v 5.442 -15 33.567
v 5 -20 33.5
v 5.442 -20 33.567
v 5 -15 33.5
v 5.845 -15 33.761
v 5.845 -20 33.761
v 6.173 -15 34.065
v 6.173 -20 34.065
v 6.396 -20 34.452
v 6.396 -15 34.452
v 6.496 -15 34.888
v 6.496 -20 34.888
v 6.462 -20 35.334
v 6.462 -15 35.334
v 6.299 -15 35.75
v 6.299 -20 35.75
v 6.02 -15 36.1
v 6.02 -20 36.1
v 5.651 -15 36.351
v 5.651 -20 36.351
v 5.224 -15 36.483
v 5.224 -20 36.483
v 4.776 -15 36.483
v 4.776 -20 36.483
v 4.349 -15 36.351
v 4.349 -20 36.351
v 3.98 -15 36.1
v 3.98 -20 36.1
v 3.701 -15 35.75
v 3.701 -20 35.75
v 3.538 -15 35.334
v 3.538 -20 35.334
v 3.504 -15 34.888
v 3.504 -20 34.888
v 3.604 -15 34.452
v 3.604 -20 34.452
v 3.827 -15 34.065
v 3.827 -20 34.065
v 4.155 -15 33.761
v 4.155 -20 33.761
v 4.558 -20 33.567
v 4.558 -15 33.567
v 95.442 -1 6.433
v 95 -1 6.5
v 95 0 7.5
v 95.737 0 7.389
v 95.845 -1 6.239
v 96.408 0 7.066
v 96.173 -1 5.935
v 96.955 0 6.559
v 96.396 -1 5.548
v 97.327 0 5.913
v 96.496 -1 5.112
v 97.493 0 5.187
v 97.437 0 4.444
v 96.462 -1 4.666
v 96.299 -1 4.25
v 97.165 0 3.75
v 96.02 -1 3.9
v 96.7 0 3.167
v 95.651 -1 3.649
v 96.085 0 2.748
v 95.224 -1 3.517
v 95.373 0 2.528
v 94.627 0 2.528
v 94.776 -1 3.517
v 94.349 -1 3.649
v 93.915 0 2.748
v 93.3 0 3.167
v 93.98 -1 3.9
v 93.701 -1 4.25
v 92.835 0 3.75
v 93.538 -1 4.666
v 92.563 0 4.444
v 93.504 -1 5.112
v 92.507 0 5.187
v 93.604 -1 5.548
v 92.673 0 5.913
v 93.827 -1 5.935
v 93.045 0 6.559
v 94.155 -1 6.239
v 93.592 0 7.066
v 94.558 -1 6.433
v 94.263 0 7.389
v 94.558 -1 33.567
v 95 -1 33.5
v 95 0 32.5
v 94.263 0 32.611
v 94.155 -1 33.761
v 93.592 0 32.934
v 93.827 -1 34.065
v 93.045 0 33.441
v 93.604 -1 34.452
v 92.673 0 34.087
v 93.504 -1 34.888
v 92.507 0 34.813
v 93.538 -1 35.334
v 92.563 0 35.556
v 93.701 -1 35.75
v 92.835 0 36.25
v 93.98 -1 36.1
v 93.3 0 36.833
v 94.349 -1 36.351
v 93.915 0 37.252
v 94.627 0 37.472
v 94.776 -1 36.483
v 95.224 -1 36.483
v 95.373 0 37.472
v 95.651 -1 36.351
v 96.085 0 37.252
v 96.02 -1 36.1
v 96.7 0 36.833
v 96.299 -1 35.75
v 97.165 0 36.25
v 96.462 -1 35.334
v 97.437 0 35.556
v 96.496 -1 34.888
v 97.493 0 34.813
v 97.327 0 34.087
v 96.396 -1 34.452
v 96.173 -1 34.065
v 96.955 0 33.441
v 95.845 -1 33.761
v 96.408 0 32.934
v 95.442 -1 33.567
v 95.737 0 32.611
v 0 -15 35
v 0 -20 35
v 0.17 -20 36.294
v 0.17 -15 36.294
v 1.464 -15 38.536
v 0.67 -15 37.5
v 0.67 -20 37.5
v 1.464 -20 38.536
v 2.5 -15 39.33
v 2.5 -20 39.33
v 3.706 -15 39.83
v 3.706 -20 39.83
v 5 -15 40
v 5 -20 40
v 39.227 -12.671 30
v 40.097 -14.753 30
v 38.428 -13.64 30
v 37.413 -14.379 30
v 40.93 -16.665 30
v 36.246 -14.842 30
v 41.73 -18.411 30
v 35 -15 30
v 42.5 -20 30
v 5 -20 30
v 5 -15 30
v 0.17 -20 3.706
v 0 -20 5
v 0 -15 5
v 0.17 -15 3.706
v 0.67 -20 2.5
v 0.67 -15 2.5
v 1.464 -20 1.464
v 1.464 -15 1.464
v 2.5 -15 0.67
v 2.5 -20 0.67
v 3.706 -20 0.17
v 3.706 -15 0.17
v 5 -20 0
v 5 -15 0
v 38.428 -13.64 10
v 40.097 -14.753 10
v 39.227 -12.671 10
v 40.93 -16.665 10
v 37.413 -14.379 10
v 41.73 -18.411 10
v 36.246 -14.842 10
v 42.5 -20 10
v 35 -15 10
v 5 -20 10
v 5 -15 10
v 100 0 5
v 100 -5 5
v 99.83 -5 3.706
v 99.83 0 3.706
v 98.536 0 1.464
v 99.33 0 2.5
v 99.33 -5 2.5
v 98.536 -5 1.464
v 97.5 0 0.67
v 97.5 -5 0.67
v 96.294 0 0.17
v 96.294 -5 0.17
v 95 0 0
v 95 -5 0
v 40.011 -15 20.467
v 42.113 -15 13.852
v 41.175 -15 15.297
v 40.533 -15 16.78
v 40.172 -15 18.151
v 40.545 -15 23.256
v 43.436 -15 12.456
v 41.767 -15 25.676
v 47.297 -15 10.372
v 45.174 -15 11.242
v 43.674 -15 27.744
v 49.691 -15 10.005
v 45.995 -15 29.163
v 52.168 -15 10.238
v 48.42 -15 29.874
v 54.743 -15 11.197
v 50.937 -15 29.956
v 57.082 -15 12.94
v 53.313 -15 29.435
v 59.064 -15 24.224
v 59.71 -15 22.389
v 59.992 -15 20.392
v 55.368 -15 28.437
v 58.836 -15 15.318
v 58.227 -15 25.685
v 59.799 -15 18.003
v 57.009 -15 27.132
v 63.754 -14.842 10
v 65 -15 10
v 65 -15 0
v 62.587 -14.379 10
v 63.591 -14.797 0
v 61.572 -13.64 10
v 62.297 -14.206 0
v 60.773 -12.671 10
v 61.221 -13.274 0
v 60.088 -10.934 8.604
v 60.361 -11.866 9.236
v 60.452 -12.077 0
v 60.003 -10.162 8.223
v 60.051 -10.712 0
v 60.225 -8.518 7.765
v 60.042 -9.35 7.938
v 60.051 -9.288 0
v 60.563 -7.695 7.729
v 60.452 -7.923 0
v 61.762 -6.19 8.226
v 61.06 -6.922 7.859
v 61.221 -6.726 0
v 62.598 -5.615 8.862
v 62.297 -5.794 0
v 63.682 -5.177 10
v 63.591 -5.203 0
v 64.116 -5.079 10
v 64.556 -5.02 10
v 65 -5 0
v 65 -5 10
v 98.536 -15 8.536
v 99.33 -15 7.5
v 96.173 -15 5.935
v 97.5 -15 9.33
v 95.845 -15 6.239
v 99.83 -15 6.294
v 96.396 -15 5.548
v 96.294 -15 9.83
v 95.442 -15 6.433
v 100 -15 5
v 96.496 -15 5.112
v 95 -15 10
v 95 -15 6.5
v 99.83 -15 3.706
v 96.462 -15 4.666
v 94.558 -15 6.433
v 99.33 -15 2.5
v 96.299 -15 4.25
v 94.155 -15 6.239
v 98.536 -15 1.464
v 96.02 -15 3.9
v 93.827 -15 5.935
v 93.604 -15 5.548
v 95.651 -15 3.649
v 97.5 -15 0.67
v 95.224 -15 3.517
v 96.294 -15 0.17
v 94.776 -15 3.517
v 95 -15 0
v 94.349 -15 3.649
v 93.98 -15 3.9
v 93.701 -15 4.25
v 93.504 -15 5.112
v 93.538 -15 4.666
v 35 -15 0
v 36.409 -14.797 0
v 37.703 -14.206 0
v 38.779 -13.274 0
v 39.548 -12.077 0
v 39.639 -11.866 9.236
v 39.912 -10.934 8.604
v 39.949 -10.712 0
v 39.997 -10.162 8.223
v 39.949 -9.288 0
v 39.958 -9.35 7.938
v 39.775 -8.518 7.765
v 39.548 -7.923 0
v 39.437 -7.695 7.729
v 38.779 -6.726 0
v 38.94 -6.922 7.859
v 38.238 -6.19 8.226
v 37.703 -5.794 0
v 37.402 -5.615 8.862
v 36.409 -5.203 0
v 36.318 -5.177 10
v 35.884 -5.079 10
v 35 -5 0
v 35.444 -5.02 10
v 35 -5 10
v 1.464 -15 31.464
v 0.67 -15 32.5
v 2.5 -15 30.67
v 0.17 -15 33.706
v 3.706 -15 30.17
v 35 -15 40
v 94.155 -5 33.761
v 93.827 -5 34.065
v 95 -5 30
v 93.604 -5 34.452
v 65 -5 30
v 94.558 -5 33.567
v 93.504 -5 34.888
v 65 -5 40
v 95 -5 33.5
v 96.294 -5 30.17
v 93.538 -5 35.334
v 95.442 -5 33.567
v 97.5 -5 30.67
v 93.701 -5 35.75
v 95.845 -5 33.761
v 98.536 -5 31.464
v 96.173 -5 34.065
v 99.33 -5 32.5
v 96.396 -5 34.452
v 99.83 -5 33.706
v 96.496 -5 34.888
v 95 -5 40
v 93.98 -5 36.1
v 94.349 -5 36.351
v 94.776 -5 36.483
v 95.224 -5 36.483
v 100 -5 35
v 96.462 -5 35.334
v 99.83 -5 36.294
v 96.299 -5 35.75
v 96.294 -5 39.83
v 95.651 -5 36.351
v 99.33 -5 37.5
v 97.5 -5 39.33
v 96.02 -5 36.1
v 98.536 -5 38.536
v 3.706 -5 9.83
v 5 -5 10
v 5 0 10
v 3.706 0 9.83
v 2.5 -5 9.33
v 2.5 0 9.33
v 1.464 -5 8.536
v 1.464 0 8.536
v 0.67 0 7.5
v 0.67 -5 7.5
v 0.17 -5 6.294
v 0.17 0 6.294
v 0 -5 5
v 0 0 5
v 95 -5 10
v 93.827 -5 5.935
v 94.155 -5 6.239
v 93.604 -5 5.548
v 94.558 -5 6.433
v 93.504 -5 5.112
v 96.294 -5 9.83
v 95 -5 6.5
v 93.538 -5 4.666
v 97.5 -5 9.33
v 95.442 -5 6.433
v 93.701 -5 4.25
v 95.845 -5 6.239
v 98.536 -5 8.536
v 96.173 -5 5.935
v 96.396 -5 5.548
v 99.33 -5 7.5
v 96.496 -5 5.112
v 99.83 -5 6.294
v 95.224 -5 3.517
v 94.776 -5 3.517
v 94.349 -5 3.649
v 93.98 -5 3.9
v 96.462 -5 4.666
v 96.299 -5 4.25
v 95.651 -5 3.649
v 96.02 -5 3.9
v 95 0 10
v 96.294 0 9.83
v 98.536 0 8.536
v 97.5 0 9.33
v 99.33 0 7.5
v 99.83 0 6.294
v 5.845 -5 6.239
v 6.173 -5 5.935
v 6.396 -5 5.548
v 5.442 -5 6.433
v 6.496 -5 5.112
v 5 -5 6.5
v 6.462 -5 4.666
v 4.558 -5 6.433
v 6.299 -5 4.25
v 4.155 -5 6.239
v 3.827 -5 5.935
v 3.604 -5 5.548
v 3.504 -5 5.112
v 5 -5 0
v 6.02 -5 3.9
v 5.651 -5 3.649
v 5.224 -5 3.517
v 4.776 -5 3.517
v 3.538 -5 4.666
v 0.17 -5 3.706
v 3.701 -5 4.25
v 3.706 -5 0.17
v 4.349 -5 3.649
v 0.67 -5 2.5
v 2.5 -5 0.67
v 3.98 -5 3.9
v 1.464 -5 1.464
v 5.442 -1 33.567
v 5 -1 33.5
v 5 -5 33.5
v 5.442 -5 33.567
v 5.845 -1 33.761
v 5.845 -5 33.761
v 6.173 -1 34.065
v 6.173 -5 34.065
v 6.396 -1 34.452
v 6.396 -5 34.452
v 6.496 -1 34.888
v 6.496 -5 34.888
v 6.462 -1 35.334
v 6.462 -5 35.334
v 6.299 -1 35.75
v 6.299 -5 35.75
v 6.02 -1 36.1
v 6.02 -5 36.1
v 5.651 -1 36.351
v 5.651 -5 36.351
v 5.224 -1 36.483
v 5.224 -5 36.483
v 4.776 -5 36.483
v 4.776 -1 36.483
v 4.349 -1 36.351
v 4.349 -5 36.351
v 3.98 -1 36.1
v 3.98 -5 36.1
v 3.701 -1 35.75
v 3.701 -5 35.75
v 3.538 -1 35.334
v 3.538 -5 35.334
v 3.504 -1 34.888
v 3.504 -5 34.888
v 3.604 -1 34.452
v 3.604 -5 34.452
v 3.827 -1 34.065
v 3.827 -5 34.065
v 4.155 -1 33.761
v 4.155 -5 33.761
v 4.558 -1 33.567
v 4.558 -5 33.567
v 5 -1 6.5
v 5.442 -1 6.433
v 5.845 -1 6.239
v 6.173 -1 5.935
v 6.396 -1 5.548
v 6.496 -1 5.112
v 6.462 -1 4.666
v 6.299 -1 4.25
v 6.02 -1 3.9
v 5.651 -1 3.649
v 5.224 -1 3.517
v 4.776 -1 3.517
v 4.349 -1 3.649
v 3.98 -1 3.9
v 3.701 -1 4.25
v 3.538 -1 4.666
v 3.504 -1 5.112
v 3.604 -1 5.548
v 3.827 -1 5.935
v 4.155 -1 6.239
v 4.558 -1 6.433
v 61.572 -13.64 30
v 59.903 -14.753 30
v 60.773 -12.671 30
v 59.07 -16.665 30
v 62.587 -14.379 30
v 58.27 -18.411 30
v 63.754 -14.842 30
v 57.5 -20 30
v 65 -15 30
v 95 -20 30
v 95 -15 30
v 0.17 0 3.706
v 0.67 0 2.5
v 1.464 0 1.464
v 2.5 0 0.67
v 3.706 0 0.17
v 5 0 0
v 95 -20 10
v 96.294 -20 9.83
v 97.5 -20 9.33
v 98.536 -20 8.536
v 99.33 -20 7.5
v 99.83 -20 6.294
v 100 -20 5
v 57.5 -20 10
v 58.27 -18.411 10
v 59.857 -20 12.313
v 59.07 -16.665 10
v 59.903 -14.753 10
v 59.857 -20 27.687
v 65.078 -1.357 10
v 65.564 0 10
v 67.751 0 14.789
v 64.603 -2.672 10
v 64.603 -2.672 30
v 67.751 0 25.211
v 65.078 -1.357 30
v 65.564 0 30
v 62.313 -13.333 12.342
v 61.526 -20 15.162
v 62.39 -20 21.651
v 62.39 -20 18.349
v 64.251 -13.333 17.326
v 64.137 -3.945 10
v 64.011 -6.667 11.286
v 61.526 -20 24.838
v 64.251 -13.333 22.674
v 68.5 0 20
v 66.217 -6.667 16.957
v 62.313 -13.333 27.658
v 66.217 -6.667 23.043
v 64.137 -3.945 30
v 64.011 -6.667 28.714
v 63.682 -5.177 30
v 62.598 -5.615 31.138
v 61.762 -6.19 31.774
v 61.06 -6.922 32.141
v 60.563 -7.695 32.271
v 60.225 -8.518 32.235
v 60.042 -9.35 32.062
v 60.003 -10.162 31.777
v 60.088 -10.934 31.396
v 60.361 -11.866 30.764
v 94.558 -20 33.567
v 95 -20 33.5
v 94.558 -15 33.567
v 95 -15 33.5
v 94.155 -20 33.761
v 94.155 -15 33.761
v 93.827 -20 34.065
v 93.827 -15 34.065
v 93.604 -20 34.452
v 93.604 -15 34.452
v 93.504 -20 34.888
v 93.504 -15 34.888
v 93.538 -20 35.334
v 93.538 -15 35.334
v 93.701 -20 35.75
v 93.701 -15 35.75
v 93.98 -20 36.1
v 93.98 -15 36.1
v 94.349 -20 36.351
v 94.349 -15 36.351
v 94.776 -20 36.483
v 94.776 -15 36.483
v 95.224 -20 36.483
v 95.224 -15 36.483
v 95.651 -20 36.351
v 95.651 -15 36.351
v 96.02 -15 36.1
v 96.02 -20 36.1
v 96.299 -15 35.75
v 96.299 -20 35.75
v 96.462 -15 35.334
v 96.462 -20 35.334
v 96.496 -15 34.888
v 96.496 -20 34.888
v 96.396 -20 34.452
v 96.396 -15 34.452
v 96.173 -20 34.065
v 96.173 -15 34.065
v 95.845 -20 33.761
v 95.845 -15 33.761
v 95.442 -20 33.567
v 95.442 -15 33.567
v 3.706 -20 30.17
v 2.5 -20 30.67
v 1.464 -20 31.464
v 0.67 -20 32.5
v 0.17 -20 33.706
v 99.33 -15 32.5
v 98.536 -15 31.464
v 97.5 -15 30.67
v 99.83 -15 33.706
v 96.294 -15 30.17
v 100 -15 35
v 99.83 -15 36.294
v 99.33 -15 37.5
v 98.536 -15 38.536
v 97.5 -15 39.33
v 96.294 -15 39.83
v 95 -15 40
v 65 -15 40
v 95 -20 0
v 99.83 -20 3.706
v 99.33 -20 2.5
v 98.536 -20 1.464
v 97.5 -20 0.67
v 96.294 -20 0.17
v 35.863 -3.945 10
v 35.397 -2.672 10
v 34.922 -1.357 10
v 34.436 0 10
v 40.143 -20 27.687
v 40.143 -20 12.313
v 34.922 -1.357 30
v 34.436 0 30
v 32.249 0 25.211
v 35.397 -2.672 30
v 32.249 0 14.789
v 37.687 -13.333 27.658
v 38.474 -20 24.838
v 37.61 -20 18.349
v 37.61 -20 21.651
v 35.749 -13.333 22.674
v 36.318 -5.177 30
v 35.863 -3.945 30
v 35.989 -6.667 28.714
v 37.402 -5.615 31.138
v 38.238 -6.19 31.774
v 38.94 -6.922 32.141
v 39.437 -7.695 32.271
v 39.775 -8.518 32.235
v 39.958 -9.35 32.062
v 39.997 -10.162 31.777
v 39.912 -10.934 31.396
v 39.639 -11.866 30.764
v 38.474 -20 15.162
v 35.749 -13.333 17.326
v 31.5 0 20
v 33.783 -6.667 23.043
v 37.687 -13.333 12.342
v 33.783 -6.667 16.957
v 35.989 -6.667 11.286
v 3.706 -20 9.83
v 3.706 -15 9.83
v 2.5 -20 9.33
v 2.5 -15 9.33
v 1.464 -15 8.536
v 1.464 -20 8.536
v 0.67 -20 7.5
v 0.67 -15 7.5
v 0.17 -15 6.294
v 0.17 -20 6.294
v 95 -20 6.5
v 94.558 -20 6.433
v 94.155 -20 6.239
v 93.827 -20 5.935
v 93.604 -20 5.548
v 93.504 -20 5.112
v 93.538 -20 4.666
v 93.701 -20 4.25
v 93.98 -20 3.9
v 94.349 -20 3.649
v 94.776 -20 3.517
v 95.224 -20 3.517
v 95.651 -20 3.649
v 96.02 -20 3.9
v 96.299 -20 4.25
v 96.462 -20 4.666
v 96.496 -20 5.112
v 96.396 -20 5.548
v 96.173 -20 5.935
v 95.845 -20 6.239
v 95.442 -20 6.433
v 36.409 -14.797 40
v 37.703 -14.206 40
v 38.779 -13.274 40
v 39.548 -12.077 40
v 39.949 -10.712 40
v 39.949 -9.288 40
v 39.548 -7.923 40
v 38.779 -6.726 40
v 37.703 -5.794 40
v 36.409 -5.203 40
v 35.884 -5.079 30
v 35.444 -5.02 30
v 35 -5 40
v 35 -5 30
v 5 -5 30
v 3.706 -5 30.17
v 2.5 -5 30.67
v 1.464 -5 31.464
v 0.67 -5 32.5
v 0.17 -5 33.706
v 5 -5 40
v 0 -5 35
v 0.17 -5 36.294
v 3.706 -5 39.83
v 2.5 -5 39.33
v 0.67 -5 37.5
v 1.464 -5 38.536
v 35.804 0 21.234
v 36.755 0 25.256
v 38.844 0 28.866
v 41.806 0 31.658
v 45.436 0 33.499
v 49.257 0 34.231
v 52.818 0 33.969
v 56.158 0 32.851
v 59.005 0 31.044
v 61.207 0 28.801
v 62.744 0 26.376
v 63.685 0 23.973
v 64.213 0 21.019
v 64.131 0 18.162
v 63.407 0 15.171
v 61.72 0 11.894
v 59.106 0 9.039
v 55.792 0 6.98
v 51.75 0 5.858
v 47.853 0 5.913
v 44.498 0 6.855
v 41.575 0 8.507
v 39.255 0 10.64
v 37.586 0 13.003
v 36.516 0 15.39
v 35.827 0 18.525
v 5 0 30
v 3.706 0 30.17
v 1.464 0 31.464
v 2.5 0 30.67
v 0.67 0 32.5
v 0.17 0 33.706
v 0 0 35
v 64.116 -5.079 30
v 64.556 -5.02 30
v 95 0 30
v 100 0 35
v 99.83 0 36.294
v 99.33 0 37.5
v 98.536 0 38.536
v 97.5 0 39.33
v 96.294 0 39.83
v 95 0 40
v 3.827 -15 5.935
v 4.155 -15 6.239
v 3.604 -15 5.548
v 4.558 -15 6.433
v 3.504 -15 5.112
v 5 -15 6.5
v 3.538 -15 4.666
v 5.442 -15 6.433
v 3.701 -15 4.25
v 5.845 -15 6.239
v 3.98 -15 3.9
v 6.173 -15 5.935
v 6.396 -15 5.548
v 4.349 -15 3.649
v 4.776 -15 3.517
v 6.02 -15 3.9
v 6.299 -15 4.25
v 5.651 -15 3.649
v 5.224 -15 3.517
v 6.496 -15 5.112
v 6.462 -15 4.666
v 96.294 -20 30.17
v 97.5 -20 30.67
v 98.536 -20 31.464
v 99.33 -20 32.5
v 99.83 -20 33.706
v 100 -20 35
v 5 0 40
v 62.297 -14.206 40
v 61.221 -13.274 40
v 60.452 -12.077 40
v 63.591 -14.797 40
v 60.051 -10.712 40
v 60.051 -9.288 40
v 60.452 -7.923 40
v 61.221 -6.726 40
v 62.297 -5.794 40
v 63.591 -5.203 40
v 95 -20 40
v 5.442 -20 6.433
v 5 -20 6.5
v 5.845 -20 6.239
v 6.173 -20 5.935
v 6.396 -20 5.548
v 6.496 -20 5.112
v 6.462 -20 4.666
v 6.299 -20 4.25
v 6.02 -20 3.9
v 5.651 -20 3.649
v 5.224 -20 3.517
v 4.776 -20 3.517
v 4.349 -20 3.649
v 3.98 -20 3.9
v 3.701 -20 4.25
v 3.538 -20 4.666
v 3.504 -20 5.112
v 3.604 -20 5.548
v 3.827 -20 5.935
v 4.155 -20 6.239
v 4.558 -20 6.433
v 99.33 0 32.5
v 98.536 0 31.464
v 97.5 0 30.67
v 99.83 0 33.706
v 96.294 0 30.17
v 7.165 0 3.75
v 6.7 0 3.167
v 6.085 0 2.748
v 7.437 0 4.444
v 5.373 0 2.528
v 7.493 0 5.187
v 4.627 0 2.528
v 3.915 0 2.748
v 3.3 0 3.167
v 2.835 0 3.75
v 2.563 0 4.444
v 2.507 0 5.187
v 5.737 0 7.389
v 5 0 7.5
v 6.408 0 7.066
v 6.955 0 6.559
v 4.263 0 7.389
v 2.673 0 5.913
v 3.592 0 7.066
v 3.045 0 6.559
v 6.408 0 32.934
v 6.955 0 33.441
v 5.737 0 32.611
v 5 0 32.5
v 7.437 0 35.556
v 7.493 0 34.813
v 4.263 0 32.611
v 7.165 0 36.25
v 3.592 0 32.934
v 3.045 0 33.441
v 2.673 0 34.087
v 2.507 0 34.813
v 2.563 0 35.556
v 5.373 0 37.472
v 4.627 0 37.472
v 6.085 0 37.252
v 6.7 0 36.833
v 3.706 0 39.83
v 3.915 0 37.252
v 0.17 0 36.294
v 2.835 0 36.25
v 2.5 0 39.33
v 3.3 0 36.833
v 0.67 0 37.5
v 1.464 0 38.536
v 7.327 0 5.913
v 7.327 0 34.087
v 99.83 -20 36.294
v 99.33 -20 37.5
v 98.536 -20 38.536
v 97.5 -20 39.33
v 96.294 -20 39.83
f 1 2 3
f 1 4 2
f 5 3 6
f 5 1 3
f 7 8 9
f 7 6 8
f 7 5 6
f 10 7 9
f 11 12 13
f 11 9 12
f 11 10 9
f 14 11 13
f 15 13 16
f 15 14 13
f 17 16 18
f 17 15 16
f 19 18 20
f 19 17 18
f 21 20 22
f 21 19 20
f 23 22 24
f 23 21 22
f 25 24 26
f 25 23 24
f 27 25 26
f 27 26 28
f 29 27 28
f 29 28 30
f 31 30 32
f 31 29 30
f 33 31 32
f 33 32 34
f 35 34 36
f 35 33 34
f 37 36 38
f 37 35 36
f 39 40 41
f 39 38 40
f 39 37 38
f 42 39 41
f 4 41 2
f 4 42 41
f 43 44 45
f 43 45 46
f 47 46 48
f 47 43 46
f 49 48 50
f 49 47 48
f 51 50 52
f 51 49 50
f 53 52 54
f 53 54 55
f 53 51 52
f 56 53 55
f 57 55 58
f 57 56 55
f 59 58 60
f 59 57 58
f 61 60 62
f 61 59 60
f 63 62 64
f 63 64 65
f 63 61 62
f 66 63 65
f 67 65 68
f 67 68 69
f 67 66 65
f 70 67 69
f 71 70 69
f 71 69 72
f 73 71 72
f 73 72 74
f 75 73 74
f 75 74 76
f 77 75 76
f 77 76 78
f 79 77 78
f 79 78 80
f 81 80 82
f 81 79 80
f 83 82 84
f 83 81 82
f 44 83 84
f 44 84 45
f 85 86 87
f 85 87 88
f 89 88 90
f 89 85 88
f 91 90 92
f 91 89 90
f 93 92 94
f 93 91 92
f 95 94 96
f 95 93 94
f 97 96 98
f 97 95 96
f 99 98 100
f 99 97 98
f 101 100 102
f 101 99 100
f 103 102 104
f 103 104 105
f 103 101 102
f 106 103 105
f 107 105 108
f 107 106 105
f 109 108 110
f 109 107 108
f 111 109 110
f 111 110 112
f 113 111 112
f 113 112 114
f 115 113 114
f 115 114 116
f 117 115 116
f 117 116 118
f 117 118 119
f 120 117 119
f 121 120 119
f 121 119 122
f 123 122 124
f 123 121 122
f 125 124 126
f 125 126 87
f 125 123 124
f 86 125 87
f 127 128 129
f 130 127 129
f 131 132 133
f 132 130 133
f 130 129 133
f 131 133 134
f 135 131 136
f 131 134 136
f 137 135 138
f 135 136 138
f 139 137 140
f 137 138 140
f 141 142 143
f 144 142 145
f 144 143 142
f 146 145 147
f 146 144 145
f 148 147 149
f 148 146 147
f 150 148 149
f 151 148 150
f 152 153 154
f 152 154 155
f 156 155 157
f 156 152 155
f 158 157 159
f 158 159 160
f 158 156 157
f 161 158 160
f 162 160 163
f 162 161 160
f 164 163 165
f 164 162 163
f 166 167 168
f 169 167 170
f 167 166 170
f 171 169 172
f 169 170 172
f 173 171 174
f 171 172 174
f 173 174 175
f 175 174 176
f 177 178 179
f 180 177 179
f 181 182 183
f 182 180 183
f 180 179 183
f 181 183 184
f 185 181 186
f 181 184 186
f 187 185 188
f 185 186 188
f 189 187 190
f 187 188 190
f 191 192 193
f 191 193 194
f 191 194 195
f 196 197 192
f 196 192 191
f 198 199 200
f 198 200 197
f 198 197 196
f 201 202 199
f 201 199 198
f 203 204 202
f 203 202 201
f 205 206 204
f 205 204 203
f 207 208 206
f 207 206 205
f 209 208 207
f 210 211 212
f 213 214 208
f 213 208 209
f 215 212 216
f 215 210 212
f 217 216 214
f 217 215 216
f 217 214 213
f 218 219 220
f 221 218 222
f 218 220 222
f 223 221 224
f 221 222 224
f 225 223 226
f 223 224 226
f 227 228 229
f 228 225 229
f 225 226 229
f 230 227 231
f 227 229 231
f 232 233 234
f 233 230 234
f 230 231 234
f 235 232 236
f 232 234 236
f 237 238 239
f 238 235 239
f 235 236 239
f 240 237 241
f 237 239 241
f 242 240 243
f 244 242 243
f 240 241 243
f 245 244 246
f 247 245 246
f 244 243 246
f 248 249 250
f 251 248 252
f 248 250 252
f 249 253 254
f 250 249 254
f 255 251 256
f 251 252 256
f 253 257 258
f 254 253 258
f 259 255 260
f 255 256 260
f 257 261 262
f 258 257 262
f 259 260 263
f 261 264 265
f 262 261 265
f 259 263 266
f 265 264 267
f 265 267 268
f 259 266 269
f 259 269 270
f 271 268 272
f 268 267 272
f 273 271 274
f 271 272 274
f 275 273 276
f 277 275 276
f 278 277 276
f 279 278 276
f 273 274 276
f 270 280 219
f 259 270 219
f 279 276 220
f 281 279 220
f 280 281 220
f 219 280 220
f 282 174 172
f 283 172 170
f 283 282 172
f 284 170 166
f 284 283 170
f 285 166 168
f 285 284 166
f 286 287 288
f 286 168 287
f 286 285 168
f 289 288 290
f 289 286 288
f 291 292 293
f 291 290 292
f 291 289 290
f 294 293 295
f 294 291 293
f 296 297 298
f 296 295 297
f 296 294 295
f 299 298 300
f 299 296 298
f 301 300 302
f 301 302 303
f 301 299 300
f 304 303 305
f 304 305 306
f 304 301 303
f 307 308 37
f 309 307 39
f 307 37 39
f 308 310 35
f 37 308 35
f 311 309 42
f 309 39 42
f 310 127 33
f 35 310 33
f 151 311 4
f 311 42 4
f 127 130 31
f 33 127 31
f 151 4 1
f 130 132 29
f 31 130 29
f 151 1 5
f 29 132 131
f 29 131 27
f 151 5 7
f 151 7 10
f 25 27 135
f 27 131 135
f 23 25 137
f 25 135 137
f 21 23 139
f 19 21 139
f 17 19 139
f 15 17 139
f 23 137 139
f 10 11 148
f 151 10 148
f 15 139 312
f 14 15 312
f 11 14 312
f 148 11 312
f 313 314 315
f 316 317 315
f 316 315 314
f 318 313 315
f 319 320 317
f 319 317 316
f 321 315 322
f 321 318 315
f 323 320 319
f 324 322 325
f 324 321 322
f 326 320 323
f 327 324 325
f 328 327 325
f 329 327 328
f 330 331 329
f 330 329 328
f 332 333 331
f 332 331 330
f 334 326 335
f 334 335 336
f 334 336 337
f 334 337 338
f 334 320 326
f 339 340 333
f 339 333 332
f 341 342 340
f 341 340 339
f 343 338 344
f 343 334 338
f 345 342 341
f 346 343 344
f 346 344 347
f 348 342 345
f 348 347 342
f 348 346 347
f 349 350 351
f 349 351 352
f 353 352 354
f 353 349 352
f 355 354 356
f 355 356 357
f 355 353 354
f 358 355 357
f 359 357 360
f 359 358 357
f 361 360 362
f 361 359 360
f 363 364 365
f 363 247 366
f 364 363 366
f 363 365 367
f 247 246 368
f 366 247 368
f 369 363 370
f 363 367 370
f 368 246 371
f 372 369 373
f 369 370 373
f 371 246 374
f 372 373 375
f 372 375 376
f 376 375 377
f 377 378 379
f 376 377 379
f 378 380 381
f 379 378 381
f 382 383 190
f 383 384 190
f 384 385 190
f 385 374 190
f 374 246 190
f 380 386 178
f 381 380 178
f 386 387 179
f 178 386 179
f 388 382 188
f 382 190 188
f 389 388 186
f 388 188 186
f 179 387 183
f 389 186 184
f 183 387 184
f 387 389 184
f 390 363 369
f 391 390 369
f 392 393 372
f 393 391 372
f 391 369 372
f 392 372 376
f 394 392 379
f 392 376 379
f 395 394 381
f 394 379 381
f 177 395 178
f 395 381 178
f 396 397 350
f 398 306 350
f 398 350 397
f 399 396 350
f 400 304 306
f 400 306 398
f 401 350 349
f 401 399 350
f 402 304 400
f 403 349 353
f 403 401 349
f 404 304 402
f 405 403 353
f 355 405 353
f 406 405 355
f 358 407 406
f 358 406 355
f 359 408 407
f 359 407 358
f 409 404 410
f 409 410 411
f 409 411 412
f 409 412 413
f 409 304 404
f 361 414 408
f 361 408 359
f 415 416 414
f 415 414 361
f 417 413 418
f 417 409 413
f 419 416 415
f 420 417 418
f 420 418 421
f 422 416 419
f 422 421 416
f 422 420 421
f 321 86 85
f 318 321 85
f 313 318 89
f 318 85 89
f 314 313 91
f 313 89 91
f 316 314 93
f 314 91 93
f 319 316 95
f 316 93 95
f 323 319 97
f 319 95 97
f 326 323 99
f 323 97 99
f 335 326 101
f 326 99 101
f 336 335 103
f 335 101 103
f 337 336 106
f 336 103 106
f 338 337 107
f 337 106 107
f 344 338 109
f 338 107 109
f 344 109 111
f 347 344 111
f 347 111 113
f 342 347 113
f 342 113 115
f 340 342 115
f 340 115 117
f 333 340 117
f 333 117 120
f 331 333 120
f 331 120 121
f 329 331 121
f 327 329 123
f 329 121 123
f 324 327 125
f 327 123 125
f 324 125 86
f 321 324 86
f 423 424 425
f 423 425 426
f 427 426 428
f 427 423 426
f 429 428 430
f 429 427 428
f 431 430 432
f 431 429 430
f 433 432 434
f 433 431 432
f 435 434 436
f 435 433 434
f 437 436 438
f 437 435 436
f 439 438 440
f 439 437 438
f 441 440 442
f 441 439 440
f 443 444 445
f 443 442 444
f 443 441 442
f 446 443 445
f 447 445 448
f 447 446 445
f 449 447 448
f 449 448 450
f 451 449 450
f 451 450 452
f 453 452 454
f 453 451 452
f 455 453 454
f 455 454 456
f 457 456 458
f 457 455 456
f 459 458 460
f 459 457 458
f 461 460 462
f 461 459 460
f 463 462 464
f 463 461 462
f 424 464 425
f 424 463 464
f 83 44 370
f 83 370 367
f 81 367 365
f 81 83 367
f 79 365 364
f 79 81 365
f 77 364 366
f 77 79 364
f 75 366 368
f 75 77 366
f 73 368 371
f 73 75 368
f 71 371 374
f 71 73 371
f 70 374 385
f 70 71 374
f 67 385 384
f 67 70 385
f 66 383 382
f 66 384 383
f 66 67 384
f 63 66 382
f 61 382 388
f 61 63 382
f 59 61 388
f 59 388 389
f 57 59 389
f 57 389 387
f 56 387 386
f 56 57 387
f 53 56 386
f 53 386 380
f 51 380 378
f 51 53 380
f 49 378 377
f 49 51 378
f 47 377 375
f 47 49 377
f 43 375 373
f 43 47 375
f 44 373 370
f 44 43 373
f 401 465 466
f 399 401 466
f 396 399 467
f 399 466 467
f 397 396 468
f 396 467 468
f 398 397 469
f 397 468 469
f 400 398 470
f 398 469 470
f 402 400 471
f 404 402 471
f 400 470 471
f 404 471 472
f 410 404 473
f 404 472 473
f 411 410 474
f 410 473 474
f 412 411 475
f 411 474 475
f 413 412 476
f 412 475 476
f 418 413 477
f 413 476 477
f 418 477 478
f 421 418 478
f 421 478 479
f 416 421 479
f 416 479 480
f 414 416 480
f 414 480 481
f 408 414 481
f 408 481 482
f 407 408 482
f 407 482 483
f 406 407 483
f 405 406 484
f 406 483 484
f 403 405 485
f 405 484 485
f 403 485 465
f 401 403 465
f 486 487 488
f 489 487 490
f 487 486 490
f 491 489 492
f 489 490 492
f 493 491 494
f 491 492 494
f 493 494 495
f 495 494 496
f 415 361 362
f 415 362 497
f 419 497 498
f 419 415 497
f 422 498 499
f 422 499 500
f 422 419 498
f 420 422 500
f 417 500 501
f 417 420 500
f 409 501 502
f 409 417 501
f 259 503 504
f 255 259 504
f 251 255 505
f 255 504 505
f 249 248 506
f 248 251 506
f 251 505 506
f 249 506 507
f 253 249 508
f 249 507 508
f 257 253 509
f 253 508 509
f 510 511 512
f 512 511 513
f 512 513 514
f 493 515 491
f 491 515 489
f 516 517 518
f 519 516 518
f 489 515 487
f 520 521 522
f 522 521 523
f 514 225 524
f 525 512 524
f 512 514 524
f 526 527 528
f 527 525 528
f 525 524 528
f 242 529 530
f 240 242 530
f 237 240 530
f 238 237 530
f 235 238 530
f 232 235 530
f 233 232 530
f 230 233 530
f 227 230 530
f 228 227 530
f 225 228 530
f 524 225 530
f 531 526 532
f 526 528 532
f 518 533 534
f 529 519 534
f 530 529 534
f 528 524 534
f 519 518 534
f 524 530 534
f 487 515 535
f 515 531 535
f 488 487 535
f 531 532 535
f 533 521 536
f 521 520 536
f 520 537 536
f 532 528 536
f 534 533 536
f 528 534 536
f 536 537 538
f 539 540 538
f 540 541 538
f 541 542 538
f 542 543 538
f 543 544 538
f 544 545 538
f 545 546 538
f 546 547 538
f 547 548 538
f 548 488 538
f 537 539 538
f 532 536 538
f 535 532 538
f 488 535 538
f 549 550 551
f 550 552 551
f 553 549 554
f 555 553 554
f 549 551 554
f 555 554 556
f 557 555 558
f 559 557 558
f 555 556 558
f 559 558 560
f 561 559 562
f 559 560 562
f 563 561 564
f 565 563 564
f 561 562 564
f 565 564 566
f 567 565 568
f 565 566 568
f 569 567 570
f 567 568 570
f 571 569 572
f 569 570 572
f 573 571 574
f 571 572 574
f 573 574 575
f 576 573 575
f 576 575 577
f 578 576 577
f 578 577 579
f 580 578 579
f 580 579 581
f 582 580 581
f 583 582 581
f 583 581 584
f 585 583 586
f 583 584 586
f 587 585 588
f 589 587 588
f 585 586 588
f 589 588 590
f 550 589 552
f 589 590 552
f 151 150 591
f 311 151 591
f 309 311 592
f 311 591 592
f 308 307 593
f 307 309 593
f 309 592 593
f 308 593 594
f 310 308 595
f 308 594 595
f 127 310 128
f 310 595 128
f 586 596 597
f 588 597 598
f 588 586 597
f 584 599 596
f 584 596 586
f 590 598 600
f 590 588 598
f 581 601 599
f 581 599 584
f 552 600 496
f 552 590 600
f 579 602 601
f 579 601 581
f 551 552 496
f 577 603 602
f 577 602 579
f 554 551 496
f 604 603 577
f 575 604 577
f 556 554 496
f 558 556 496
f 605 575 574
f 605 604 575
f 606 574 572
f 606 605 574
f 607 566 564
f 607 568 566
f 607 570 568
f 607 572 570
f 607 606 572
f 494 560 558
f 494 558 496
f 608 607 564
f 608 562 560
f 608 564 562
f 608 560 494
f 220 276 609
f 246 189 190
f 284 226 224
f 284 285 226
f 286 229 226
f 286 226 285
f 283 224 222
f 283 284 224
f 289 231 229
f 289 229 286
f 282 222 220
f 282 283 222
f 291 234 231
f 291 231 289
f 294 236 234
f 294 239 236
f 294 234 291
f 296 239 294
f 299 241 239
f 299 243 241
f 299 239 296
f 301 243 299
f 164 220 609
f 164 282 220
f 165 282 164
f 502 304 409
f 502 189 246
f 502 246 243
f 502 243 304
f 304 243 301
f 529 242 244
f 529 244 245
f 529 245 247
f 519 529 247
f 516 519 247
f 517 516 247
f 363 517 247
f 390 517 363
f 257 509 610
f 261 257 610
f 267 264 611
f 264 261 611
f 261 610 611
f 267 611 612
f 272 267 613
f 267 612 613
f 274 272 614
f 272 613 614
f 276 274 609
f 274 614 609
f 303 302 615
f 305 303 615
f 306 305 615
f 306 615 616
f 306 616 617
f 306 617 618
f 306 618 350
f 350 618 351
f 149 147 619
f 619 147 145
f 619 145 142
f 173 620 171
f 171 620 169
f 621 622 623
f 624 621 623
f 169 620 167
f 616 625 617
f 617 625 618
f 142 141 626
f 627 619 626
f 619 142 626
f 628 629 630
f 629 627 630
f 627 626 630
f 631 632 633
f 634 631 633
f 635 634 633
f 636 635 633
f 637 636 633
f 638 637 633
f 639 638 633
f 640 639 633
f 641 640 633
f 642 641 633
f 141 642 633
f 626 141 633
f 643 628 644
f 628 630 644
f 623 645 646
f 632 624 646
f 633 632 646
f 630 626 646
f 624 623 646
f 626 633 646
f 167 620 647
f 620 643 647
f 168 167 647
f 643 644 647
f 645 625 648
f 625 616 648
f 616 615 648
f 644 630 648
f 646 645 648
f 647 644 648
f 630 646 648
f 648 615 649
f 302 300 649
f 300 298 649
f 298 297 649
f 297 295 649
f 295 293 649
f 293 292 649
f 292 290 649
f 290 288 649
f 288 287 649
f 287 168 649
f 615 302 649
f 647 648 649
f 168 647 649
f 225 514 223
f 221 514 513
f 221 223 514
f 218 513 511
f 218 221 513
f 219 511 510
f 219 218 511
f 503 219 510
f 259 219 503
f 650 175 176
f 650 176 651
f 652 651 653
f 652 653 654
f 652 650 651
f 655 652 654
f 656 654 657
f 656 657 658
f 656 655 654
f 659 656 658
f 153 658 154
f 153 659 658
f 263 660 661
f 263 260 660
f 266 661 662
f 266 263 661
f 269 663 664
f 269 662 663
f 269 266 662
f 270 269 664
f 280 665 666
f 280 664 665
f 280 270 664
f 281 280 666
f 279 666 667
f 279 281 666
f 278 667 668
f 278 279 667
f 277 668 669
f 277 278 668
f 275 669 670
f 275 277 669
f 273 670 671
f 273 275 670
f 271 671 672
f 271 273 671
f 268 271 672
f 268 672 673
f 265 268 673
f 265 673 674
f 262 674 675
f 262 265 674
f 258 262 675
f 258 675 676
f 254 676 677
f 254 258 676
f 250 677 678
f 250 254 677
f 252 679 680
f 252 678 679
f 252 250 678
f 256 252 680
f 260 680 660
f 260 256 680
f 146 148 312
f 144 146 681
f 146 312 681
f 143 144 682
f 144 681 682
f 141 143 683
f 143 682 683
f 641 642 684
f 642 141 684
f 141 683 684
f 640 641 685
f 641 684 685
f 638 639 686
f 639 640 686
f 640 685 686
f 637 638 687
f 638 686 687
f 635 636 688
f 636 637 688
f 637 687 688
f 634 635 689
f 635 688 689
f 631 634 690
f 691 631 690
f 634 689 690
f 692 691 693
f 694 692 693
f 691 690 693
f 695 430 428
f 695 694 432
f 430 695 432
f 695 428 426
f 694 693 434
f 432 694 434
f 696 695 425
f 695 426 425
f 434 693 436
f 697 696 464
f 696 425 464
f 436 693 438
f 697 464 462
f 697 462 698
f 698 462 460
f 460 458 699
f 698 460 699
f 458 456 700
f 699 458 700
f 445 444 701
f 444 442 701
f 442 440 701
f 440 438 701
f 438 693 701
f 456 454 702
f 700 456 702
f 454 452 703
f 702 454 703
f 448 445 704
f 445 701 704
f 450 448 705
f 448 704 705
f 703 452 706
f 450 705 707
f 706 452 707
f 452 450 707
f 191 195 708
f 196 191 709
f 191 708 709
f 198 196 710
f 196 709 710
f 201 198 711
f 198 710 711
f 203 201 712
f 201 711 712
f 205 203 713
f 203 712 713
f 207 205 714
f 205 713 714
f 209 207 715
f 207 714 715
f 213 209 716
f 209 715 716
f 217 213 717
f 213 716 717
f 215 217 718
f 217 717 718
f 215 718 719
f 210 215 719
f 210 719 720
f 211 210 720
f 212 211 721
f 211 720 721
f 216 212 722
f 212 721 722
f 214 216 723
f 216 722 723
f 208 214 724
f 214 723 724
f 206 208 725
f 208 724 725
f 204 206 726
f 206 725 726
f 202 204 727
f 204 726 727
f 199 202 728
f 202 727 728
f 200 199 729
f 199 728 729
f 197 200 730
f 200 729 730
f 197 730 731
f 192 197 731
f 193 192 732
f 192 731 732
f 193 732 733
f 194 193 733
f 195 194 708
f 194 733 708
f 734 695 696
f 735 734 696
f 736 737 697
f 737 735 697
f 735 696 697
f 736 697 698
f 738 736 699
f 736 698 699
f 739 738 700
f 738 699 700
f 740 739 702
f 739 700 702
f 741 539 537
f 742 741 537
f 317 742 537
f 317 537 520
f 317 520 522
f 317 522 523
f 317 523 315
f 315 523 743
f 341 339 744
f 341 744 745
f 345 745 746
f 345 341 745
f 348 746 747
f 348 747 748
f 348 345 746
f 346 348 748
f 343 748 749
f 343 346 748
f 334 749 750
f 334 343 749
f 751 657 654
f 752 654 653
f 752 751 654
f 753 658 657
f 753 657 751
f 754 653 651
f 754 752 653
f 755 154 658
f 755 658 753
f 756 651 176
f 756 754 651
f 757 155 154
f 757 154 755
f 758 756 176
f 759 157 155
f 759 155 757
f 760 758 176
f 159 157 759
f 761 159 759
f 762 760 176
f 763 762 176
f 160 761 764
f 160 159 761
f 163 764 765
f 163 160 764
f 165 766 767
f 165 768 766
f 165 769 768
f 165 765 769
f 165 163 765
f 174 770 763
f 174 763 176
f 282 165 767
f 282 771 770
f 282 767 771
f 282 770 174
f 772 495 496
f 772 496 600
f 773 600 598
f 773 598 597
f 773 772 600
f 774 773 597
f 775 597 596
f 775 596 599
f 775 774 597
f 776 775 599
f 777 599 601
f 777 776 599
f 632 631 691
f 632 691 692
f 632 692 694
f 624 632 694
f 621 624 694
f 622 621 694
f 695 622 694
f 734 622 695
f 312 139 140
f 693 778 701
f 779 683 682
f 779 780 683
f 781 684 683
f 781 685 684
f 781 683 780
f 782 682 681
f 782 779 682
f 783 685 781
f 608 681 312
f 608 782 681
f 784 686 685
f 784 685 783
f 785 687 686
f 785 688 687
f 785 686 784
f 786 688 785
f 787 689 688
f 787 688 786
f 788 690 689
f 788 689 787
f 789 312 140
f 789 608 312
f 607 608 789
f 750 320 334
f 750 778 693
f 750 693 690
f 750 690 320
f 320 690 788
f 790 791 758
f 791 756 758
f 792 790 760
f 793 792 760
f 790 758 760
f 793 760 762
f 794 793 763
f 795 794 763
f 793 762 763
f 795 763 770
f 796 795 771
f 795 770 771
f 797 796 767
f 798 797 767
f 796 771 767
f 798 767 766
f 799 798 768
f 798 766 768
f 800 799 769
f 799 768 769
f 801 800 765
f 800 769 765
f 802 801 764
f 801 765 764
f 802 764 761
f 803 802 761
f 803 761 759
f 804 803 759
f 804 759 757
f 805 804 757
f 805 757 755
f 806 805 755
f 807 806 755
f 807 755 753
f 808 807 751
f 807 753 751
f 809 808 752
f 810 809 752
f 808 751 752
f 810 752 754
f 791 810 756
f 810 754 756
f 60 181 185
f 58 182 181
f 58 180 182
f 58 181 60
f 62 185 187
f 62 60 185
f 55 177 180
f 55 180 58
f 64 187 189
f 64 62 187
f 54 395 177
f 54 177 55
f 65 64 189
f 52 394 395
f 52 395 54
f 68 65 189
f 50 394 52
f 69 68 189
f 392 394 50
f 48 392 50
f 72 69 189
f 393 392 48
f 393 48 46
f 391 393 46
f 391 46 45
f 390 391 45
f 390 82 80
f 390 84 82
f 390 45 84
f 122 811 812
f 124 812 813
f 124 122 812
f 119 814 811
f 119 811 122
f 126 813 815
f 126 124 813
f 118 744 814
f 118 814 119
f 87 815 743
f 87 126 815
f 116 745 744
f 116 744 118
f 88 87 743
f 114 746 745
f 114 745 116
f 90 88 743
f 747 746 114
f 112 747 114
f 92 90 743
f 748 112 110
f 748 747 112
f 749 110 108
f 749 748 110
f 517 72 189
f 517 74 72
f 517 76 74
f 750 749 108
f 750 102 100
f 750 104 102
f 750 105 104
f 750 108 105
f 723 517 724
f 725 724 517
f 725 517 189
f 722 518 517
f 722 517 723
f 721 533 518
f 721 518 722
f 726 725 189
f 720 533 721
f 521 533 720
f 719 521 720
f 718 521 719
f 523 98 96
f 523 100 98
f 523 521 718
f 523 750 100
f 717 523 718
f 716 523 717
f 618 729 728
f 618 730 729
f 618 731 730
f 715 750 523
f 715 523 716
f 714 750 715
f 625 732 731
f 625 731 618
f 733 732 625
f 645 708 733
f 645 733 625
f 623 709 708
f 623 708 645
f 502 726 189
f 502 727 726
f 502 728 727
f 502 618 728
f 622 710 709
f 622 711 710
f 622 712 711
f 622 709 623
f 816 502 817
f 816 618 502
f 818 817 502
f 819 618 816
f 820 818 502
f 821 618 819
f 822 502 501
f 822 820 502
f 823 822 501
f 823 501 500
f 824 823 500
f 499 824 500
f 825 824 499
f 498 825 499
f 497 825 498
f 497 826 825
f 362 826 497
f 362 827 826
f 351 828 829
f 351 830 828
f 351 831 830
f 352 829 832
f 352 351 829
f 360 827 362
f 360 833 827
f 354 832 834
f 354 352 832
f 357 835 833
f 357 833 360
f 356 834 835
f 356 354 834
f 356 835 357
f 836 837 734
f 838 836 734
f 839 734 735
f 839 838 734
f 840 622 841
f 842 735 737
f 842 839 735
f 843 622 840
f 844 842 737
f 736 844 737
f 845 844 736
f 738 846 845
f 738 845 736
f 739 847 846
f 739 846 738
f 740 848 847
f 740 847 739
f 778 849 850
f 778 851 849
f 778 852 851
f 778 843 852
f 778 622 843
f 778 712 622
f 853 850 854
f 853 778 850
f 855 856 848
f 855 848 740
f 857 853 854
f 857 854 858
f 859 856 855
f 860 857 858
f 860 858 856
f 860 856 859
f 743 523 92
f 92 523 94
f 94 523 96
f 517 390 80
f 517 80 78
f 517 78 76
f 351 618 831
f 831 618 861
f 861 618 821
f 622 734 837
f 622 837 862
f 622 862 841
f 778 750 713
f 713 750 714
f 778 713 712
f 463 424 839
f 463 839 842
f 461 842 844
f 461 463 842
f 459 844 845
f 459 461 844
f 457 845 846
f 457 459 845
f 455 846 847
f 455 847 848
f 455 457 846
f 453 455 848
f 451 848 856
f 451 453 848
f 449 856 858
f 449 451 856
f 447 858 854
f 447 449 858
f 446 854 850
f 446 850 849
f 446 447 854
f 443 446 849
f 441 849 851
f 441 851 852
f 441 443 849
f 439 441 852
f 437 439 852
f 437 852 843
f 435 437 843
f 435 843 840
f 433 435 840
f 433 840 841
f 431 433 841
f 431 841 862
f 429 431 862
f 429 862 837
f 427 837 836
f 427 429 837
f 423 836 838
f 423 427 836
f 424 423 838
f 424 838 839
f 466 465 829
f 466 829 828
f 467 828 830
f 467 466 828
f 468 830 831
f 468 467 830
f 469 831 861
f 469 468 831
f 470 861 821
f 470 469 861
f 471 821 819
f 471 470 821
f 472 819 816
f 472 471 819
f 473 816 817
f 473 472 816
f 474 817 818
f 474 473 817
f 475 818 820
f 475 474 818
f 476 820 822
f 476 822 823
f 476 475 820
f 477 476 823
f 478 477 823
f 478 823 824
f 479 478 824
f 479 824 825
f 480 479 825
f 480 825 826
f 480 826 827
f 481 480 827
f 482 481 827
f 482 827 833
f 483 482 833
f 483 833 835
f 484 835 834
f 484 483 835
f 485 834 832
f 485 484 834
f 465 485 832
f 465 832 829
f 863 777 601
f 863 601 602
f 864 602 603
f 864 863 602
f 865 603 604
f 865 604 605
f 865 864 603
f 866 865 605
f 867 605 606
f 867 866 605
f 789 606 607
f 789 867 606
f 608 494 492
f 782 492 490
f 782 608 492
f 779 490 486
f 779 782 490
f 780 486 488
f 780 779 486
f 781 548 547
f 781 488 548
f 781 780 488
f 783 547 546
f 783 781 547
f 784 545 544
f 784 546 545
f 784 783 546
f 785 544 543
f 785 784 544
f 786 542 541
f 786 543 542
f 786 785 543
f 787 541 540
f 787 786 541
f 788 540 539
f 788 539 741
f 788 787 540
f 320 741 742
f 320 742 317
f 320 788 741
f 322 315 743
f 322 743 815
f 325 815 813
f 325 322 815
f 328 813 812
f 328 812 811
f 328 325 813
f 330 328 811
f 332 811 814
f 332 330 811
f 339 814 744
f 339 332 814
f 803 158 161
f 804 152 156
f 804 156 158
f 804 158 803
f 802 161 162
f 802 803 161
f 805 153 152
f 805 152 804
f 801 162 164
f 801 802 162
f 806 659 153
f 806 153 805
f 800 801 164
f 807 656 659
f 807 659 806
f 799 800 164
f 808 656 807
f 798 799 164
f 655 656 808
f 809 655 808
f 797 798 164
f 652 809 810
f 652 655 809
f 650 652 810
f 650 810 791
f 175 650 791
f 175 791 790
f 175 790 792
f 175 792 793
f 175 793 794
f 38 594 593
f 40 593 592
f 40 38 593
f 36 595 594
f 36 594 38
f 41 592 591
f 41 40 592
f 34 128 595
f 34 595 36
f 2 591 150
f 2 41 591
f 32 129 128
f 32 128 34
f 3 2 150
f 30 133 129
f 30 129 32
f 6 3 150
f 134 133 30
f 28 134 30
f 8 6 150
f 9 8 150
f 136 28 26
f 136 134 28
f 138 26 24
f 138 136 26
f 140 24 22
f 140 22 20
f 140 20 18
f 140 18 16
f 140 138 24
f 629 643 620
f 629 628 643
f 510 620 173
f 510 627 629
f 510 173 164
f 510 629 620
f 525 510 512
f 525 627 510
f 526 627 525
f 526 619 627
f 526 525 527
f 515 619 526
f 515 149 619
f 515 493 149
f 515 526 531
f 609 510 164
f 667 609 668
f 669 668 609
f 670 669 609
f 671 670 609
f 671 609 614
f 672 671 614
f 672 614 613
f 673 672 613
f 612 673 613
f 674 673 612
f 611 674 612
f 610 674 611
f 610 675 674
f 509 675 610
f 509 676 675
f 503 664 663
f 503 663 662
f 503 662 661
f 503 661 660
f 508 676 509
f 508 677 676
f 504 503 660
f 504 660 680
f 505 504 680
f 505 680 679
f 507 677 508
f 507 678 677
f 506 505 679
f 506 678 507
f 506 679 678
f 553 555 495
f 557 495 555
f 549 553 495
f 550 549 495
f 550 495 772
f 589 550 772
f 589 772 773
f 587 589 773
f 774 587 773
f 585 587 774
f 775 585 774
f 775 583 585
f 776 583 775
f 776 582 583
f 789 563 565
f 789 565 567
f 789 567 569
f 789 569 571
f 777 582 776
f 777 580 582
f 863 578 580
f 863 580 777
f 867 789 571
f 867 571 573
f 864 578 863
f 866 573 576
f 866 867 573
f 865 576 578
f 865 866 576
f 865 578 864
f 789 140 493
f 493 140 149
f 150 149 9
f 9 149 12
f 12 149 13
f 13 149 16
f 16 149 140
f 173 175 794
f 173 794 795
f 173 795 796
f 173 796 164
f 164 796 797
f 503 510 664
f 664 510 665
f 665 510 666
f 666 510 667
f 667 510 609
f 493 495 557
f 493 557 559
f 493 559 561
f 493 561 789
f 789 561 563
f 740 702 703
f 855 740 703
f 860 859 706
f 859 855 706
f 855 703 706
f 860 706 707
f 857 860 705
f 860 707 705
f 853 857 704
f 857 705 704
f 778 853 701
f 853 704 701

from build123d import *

# Parameters (mm, degrees)
BOSS_EXTRU_1_DEPTH        = 10
ESQUISSE9_R               = 1.5
ENL_V_MAT_EXTRU_1_DEPTH   = 51.249378106
ESQUISSE4_R               = 12.5
ESQUISSE3_R               = 18.5
SYM_TRIE3_COPY_1_DEPTH    = 10
SYM_TRIE3_COPY_2_SKETCH_R = 1.5
SYM_TRIE3_COPY_2_DEPTH    = 51.249378106
CHANFREIN1_SIZE           = 1
BOSS_EXTRU_2_DEPTH        = 10


with BuildPart() as part:
    # Esquisse1 → Boss.-Extru.1 (new body)
    with BuildSketch(Plane.XY):
        with BuildLine():
            Line((0, 0), (35, 0))
            Line((35, 0), (45, 0))
            Line((45, 0), (45, -20))
            Line((45, -20), (35, -20))
            Line((35, -20), (0, -20))
            Line((0, -20), (0, -15))
            Line((0, -15), (35, -15))
            ThreePointArc((35, -15), (40, -10), (35, -5))
            Line((35, -5), (0, -5))
            Line((0, -5), (0, 0))
        make_face()
    boss_extru_1 = extrude(amount=BOSS_EXTRU_1_DEPTH)

    # Esquisse9 → Enlèv. mat.-Extru.1 (cut, symmetric)
    with BuildSketch(Plane(origin=(0, 0, 0), x_dir=(1, 0, 0), z_dir=(0, 1, 0))):
        with BuildLine():
            ThreePointArc((0, -5), (1.464466094, -1.464466094), (5, 0))
            Line((5, 0), (0, 0))
            Line((0, 0), (0, -5))
        make_face()
        with BuildLine():
            ThreePointArc((5, -10), (1.464466094, -8.535533906), (0, -5))
            Line((0, -5), (0, -10))
            Line((0, -10), (5, -10))
        make_face()
        with Locations(Location((5, -5, 0), (0, 0, 270))):
            Circle(ESQUISSE9_R)
    enl_v_mat_extru_1 = extrude(amount=ENL_V_MAT_EXTRU_1_DEPTH, both=True, mode=Mode.SUBTRACT)

    # Esquisse4 → Lissage2 section 0
    with BuildSketch(Plane.XZ.offset(20)):
        with Locations((50, 20)):
            Circle(ESQUISSE4_R)
    # Esquisse3 → Lissage2 section 1
    with BuildSketch(Plane(origin=(0, 0, 0), x_dir=(1, 0, 0), z_dir=(0, 1, 0))):
        with Locations((50, -20)):
            Circle(ESQUISSE3_R)
    loft()

    # Symétrie2: Boss.-Extru.1, Enlèv. mat.-Extru.1 across plane
    add(boss_extru_1.mirror(Plane.XY.offset(20)))
    add(enl_v_mat_extru_1.mirror(Plane.XY.offset(20)), mode=Mode.SUBTRACT)

    # Symétrie3: Boss.-Extru.1, Enlèv. mat.-Extru.1 across plane
    add(boss_extru_1.mirror(Plane(origin=(50, 0, 0), x_dir=(0, 0, 1), z_dir=(1, 0, 0))))
    add(enl_v_mat_extru_1.mirror(Plane(origin=(50, 0, 0), x_dir=(0, 0, 1), z_dir=(1, 0, 0))), mode=Mode.SUBTRACT)

    # Symétrie3 copy 1 sketch → Symétrie3 copy 1 (add)
    with BuildSketch(Plane(origin=(100, 0, 40), x_dir=(-1, 0, 0), z_dir=(0, 0, -1))):
        with BuildLine():
            Line((0, 0), (35, 0))
            Line((35, 0), (45, 0))
            Line((45, 0), (45, -20))
            Line((45, -20), (35, -20))
            Line((35, -20), (0, -20))
            Line((0, -20), (0, -15))
            Line((0, -15), (35, -15))
            ThreePointArc((35, -15), (40, -10), (35, -5))
            Line((35, -5), (0, -5))
            Line((0, -5), (0, 0))
        make_face()
    extrude(amount=SYM_TRIE3_COPY_1_DEPTH)

    # Symétrie3 copy 2 sketch → Symétrie3 copy 2 (cut, symmetric)
    with BuildSketch(Plane(origin=(100, 0, 40), x_dir=(-1, 0, 0), z_dir=(0, 1, 0))):
        with BuildLine():
            ThreePointArc((0, -5), (1.464466094, -1.464466094), (5, 0))
            Line((5, 0), (0, 0))
            Line((0, 0), (0, -5))
        make_face()
        with BuildLine():
            ThreePointArc((5, -10), (1.464466094, -8.535533906), (0, -5))
            Line((0, -5), (0, -10))
            Line((0, -10), (5, -10))
        make_face()
        with Locations(Location((5, -5, 0), (0, 0, 270))):
            Circle(SYM_TRIE3_COPY_2_SKETCH_R)
    extrude(amount=SYM_TRIE3_COPY_2_DEPTH, both=True, mode=Mode.SUBTRACT)

    # Chanfrein1
    chanfrein1_edges = [part.edges().sort_by_distance(p)[0] for p in [
        (5, 0, 36.5),
        (95, 0, 36.5),
        (95, 0, 3.5),
        (5, 0, 3.5),
    ]]
    chamfer(chanfrein1_edges, length=CHANFREIN1_SIZE)


with BuildPart() as boss_extru_2_tool:
    # Esquisse10 → Boss.-Extru.2 (new body)
    with BuildSketch(Plane.ZY.offset(-55)):
        with BuildLine():
            Line((31.456439237, -20), (40, -20))
            Line((40, -20), (40, 0))
            Line((40, 0), (37.811513131, 0))
            add(Edge.make_bspline(
                [(37.811513131, 0), (36.770961966, -3.339421755), (35.724642409, -6.676958136), (33.611133104, -13.345209566), (32.544444679, -16.67608847), (31.456439237, -20)],
                knots=[0, 0, 0, 0, 0.5, 0.5, 1, 1, 1, 1], degree=3))
        make_face()
        with BuildLine():
            Line((0, -20), (8.543560763, -20))
            add(Edge.make_bspline(
                [(8.543560763, -20), (7.455555321, -16.67608847), (6.388866896, -13.345209566), (4.275357591, -6.676958136), (3.229038034, -3.339421755), (2.188486869, 0)],
                knots=[0, 0, 0, 0, 0.5, 0.5, 1, 1, 1, 1], degree=3))
            Line((2.188486869, 0), (0, 0))
            Line((0, 0), (0, -20))
        make_face()
    extrude(amount=BOSS_EXTRU_2_DEPTH)


with BuildPart() as part_1:
    add(part.part)


with BuildPart() as part_2:
    # Boss.-Extru.2: joined with boss_extru_2_tool
    add(part_1.part.fuse(boss_extru_2_tool.part, tol=0.00001))

    # Enlèvement de matière-Lissage1: read off the stored shape, not the designer's step
    # Enlèvement de matière-Lissage1: loft between two sections, ruled curve by curve
    enl_vement_de_mati_re_lissage1_from = [
        Edge.make_bspline([(40.172449115, -15, 18.150880317), (36.47420975, -15, 37.805982088), (56.12931152, -15, 41.504221453), (59.827550885, -15, 21.849119683), (63.52579025, -15, 2.194017912), (43.87068848, -15, -1.504221453), (40.172449115, -15, 18.150880317)], [0, 0, 0, 0, 0.5, 0.5, 0.5, 1, 1, 1, 1], 3, [1, 0.333333333, 0.333333333, 1, 0.333333333, 0.333333333, 1]),
    ]
    enl_vement_de_mati_re_lissage1_to = [
        Edge.make_bspline([(35.80353412, 0, 21.234040725), (38.271615569, 0, 49.626972485), (66.66454733, 0, 47.158891036), (64.19646588, 0, 18.765959275), (61.728384431, 0, -9.626972485), (33.33545267, 0, -7.158891036), (35.80353412, 0, 21.234040725)], [0, 0, 0, 0, 0.5, 0.5, 0.5, 1, 1, 1, 1], 3, [1, 0.333333333, 0.333333333, 1, 0.333333333, 0.333333333, 1]),
    ]
    enl_vement_de_mati_re_lissage1 = Solid(Shell([*[Face.make_surface_from_curves(enl_vement_de_mati_re_lissage1_from[k], enl_vement_de_mati_re_lissage1_to[k]) for k in range(1)], Face(Wire(enl_vement_de_mati_re_lissage1_from)), Face(Wire(enl_vement_de_mati_re_lissage1_to))]))
    add(enl_vement_de_mati_re_lissage1, mode=Mode.SUBTRACT)


solid = part_2.part
